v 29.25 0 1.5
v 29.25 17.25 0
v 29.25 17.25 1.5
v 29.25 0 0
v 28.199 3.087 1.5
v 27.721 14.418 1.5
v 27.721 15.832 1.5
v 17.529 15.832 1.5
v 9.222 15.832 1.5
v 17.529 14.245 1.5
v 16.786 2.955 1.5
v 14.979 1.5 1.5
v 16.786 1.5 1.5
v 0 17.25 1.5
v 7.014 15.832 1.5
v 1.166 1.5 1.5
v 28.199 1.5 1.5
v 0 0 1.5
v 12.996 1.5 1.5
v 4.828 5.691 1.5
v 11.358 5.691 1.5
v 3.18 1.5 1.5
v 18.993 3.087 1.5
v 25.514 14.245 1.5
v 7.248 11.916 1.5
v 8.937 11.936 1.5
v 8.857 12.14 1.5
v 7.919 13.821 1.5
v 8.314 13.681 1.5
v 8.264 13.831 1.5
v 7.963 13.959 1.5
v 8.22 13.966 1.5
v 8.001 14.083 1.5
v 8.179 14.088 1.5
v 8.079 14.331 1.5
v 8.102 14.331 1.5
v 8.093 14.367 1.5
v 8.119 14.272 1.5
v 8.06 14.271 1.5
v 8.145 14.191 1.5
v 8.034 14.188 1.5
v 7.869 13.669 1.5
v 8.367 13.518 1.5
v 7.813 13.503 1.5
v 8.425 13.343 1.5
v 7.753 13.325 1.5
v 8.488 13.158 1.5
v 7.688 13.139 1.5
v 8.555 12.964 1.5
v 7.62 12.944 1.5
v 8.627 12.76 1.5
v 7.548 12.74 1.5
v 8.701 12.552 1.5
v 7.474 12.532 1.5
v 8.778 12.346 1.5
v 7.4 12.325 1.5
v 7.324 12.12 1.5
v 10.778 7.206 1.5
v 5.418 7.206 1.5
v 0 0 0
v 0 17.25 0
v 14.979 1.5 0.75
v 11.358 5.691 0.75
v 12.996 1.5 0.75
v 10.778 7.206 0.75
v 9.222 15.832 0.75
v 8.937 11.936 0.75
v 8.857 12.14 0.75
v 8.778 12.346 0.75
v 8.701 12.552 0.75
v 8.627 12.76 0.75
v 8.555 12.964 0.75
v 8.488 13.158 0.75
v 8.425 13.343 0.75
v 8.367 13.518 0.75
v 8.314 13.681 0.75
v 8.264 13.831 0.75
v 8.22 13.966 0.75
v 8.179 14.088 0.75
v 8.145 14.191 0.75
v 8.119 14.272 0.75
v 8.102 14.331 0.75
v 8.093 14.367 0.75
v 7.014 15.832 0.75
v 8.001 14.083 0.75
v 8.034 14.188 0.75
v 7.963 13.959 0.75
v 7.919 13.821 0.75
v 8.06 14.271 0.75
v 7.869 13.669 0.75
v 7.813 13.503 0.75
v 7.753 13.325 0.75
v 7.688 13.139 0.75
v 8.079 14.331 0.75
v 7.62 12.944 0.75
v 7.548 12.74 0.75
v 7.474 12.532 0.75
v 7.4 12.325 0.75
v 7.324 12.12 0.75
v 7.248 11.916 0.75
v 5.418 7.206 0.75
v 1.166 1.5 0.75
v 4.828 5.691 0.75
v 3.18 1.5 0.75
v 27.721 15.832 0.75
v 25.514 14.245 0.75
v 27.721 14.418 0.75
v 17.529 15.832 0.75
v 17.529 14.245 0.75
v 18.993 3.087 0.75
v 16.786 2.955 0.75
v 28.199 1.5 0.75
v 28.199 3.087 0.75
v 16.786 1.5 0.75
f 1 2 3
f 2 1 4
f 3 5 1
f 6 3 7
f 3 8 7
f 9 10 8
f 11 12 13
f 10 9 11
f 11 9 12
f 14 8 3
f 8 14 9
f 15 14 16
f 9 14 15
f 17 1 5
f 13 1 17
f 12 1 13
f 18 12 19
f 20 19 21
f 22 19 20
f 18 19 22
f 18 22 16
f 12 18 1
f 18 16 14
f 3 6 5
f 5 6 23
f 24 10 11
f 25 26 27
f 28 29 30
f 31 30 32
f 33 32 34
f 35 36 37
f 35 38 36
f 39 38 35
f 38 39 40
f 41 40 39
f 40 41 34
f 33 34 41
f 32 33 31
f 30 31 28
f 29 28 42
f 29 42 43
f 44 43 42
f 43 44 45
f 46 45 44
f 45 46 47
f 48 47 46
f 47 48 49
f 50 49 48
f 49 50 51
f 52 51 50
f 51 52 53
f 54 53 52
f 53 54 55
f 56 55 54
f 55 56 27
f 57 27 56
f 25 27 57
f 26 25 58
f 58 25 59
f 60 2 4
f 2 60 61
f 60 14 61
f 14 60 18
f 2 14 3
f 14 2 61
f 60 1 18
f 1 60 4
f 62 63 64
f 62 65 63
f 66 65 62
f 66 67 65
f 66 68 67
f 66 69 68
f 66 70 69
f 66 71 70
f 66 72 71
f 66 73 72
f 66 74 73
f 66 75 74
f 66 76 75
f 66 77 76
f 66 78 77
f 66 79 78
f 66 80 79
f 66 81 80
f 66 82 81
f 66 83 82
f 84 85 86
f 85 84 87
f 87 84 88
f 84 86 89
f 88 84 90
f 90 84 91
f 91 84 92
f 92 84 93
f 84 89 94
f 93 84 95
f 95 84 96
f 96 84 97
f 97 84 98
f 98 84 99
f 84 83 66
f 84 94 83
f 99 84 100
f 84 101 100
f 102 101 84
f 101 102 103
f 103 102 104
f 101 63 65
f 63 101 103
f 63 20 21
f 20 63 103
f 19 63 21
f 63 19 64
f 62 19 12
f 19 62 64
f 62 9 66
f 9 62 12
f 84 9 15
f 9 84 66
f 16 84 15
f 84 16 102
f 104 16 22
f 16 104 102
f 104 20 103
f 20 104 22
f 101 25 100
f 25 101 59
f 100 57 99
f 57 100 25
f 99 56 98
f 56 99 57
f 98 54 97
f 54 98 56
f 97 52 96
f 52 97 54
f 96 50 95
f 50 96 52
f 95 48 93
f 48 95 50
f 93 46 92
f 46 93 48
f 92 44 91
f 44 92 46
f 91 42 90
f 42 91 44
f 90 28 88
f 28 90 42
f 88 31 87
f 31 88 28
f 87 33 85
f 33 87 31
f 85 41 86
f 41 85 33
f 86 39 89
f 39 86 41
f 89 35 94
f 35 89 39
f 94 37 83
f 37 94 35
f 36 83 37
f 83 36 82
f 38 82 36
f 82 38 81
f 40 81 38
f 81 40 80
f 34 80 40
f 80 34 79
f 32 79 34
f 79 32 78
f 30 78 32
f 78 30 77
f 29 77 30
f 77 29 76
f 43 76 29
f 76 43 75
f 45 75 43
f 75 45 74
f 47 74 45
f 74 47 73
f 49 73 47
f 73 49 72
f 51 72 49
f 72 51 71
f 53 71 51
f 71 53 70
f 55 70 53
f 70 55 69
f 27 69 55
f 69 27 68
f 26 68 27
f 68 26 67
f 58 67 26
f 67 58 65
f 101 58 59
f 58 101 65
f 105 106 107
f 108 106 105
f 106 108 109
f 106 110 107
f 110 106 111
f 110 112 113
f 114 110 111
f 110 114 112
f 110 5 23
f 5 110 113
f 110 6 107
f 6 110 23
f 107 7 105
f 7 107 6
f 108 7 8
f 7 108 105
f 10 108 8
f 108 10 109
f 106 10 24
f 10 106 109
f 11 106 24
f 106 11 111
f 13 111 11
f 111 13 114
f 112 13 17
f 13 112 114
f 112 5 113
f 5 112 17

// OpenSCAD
//variable description
firstLetter = "A"; //[A, B, C, D, E, F, G, H, I, J, K, L, M, N, O, P, Q, R, S, T, U, V, W, X, Y, Z] 
secondLetter = "Z"; //[A, B, C, D, E, F, G, H, I, J, K, L, M, N, O, P, Q, R, S, T, U, V, W, X, Y, Z] 
firstLetterWidth = 10; //[3:13]
secondLetterWidth = 8; //[3:13]
scaleFactor = 1.5; //[1.5,2,2.5]
overallWidth = firstLetterWidth+secondLetterWidth+1.5;
height = 1.5;

scale([scaleFactor,scaleFactor,1]) {
    difference() {        
        cube([overallWidth,11.5,height]);
        # translate([0.75,1,height/2]) {
            linear_extrude(height/2+0.1) {
                text(firstLetter);
            }
        }
        # translate([0.75+firstLetterWidth,1,height/2]) {
            linear_extrude(height/2+0.1) {
                text(secondLetter);
            }
        }
    }
}
